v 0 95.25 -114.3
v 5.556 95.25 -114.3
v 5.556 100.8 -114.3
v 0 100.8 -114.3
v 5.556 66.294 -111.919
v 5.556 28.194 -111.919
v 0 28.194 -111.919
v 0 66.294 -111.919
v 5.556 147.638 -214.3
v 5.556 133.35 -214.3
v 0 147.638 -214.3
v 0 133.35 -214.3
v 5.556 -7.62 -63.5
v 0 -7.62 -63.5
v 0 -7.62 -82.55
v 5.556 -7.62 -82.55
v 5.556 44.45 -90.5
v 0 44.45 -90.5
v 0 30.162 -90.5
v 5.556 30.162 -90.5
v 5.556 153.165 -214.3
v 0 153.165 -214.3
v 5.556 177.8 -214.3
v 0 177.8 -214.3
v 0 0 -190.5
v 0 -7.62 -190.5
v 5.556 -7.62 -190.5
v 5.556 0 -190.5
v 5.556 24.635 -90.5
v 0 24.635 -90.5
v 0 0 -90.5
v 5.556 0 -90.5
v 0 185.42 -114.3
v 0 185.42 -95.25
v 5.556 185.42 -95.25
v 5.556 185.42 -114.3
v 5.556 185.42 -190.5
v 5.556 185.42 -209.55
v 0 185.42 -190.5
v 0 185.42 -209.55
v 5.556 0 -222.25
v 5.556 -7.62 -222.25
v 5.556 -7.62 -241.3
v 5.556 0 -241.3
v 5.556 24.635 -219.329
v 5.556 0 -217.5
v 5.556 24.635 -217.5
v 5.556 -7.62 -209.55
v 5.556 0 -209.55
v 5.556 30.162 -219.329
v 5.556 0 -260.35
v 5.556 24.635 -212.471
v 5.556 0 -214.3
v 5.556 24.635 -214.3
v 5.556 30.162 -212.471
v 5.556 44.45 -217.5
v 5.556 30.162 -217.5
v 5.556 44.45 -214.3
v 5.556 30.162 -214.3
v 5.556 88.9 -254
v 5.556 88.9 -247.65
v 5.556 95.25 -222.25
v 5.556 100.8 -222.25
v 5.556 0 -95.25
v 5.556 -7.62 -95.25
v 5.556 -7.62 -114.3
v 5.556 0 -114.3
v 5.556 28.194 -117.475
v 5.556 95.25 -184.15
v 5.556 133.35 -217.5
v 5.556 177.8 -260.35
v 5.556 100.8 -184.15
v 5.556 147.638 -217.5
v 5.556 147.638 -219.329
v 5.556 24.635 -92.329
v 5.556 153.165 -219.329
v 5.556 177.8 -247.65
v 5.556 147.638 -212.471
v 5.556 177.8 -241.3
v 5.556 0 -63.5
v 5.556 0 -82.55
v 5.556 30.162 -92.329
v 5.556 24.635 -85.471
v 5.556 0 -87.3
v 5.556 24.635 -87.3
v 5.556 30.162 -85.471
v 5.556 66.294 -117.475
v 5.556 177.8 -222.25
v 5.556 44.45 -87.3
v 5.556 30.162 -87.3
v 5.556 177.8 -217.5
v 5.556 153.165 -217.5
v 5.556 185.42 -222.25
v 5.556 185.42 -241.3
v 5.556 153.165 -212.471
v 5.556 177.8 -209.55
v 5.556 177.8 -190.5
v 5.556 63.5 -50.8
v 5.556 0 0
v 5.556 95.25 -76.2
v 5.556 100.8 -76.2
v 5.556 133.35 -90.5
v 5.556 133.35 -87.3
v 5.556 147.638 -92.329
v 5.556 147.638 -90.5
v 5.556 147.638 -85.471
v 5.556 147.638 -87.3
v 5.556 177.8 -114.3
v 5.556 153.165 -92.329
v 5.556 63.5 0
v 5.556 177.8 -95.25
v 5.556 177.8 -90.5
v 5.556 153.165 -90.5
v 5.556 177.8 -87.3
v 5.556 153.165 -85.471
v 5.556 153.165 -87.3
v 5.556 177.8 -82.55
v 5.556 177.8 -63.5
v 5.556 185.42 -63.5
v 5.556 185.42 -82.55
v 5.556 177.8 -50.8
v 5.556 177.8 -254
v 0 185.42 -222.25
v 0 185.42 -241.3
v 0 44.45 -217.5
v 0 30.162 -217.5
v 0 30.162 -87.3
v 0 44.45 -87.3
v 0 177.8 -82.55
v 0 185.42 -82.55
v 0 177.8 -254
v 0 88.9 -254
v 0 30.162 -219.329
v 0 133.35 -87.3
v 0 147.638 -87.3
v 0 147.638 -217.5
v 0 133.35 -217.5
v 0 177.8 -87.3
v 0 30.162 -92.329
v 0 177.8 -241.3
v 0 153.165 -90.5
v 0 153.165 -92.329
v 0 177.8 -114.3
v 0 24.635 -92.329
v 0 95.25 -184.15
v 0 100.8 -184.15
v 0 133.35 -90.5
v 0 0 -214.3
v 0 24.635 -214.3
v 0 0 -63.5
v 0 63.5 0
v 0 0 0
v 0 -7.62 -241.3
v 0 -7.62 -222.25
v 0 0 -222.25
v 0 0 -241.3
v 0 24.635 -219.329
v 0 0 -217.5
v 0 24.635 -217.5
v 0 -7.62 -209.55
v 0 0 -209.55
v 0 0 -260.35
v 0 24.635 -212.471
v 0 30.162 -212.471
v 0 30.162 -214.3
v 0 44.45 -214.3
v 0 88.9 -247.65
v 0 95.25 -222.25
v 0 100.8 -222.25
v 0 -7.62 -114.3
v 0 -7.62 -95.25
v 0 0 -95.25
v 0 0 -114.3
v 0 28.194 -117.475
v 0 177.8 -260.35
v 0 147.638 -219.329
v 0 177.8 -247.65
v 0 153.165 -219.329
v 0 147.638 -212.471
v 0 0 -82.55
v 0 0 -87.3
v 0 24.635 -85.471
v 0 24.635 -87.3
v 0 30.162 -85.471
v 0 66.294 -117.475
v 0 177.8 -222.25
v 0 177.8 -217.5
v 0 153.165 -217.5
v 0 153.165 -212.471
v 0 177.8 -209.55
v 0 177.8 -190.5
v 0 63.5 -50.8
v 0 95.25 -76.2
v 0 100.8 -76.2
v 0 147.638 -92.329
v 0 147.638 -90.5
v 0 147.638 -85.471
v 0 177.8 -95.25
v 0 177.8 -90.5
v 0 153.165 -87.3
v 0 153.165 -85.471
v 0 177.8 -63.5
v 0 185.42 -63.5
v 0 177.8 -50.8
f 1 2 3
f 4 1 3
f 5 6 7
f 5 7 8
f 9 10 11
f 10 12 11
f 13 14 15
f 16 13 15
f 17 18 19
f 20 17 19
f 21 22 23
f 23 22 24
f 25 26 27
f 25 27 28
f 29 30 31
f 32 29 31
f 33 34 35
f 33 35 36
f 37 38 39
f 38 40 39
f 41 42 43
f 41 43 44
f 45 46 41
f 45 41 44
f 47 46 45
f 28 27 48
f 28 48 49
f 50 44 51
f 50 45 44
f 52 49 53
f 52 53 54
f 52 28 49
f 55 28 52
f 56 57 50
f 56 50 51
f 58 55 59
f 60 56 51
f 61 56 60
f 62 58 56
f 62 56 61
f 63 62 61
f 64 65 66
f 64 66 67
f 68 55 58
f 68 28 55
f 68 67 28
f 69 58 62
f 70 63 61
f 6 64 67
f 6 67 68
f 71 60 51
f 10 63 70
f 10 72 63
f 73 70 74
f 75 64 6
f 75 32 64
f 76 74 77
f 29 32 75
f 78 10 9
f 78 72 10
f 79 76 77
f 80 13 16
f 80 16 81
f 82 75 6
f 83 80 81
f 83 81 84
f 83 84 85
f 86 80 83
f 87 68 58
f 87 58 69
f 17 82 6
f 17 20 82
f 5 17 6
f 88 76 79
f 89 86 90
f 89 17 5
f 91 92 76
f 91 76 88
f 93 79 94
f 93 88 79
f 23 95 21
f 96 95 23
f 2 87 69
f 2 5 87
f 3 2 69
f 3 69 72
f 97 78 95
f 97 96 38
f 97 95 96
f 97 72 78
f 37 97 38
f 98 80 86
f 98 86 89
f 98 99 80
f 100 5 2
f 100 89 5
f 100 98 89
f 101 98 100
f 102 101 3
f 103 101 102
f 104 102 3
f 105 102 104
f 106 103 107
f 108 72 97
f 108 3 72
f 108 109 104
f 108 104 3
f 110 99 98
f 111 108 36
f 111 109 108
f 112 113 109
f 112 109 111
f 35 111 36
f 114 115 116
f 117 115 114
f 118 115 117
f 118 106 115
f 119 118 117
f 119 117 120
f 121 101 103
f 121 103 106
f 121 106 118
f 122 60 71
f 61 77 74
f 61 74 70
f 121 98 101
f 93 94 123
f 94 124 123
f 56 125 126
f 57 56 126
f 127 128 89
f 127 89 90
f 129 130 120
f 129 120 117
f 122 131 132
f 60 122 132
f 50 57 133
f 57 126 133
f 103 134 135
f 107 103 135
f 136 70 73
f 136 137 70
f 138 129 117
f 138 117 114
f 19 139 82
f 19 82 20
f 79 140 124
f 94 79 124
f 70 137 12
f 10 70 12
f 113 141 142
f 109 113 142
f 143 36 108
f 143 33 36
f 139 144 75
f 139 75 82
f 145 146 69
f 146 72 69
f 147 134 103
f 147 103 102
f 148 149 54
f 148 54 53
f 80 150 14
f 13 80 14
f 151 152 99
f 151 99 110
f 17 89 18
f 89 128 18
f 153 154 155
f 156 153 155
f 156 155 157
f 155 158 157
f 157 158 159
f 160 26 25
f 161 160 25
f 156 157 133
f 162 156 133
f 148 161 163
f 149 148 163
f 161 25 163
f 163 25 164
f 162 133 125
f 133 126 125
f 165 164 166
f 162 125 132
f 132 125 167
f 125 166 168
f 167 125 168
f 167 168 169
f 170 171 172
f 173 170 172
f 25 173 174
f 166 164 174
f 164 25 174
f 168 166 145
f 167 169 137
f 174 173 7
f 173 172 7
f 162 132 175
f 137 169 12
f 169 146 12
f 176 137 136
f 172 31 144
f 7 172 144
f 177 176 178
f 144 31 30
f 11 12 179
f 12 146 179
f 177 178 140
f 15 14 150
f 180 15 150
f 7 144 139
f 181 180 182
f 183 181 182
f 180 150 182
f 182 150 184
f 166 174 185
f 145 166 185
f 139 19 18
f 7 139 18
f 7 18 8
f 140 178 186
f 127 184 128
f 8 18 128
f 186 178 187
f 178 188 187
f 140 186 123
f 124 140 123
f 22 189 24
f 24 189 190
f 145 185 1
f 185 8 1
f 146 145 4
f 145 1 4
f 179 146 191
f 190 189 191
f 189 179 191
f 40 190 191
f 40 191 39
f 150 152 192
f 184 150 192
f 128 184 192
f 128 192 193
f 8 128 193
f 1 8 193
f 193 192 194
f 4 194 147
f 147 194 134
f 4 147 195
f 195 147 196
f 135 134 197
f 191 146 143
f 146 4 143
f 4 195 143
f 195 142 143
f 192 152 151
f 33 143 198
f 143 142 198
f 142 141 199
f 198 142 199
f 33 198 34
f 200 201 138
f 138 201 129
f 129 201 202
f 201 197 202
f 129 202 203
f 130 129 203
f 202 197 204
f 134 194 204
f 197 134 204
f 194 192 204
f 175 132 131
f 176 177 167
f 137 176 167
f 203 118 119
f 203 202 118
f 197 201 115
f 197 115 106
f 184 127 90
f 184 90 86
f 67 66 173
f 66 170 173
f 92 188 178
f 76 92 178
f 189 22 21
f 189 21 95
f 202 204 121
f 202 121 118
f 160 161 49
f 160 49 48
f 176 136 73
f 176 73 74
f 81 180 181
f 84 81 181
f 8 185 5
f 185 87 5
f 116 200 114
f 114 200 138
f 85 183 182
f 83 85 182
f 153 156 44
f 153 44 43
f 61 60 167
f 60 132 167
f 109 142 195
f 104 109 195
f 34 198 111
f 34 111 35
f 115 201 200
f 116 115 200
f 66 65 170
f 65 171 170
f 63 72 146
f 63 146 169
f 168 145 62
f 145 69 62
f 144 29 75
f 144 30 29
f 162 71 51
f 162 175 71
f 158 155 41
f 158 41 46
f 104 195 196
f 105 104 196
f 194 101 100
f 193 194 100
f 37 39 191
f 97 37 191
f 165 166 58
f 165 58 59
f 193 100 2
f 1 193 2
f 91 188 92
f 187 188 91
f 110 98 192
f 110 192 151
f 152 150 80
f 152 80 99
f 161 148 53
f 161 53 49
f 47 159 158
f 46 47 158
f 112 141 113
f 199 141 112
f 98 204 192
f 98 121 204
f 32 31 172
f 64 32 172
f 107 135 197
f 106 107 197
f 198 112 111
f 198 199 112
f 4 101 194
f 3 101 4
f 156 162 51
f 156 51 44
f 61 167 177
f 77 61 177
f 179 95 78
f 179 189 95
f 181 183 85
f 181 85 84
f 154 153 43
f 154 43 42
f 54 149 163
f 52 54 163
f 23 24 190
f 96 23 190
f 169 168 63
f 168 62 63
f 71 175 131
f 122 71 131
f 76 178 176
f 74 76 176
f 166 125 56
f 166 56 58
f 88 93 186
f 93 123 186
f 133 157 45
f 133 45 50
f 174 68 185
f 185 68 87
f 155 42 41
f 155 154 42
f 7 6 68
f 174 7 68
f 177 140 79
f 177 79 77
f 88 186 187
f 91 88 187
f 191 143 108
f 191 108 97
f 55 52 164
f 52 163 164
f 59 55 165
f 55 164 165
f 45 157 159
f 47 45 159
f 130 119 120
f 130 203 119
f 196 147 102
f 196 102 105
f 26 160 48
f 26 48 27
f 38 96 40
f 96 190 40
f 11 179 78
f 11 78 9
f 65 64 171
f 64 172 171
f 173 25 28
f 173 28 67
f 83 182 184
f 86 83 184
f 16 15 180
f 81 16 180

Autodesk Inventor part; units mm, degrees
ref_plane "YZ Plane" through (0, 0, 0) normal (1, 0, 0) x (0, 1, 0)
ref_plane "XZ Plane" through (0, 0, 0) normal (0, 1, 0) x (-1, 0, 0)
ref_plane "XY Plane" through (0, 0, 0) normal (0, 0, 1) x (1, 0, 0)
sketch "Sketch1" plane through (0, 0, 0) normal (1, 0, 0) x (0, 1, 0)
  line L0 (0, 0) -> (177.8, 0)
  line L1 (177.8, -260.35) -> (0, -260.35)
  line L2 (0, -260.35) -> (0, -241.3)
  line L3 (0, -241.3) -> (-7.62, -241.3)
  line L4 (-7.62, -241.3) -> (-7.62, -222.25)
  line L5 (-7.62, -222.25) -> (0, -222.25)
  line L6 (0, -209.55) -> (-7.62, -209.55)
  line L7 (-7.62, -209.55) -> (-7.62, -190.5)
  line L8 (-7.62, -190.5) -> (0, -190.5)
  line L9 (0, -190.5) -> (0, -152.4)
  line L10 (44.45, -215.9) -> (44.45, -214.2998)
  line L11 (44.45, -217.5002) -> (44.45, -215.9)
  line L12 (24.6348, -214.2998) -> (24.6348, -212.725)
  line L13 (24.6348, -219.075) -> (24.6348, -219.329)
  line L14 (24.6348, -219.329) -> (30.1625, -219.329)
  line L15 (24.6348, -212.725) -> (24.6348, -212.471)
  line L16 (24.6348, -212.471) -> (30.1625, -212.471)
  line L17 (24.6348, -219.075) -> (24.6348, -217.4875)
  line L18 (30.1625, -212.471) -> (30.1625, -214.2998)
  line L19 (30.1625, -217.5002) -> (30.1625, -219.329)
  line L20 (44.45, -214.2998) -> (30.1625, -214.2998)
  line L21 (24.6348, -214.2998) -> (0, -214.2998)
  line L22 (44.45, -217.5002) -> (30.1625, -217.5002)
  line L23 (24.6348, -217.5002) -> (0, -217.5002)
  line L24 (0, -63.5) -> (-7.62, -63.5)
  line L25 (-7.62, -63.5) -> (-7.62, -82.55)
  line L26 (-7.62, -82.55) -> (0, -82.55)
  line L27 (0, -95.25) -> (-7.62, -95.25)
  line L28 (-7.62, -95.25) -> (-7.62, -114.3)
  line L29 (-7.62, -114.3) -> (0, -114.3)
  line L30 (44.45, -88.9) -> (44.45, -90.5002)
  line L31 (44.45, -87.2998) -> (44.45, -88.9)
  line L32 (24.6348, -90.5002) -> (24.6348, -92.075)
  line L33 (24.6348, -85.725) -> (24.6348, -85.471)
  line L34 (24.6348, -85.471) -> (30.1625, -85.471)
  line L35 (24.6348, -92.075) -> (24.6348, -92.329)
  line L36 (24.6348, -92.329) -> (30.1625, -92.329)
  line L37 (24.6348, -85.725) -> (24.6348, -87.3125)
  line L38 (30.1625, -92.329) -> (30.1625, -90.5002)
  line L39 (30.1625, -87.2998) -> (30.1625, -85.471)
  line L40 (44.45, -90.5002) -> (30.1625, -90.5002)
  line L41 (24.6348, -90.5002) -> (0, -90.5002)
  line L42 (44.45, -87.2998) -> (30.1625, -87.2998)
  line L43 (24.6348, -87.2998) -> (0, -87.2998)
  line L44 (177.8, -241.3) -> (185.42, -241.3)
  line L45 (185.42, -241.3) -> (185.42, -222.25)
  line L46 (185.42, -222.25) -> (177.8, -222.25)
  line L47 (177.8, -209.55) -> (185.42, -209.55)
  line L48 (185.42, -209.55) -> (185.42, -190.5)
  line L49 (185.42, -190.5) -> (177.8, -190.5)
  line L50 (177.8, -190.5) -> (177.8, -152.4)
  line L51 (133.35, -215.9) -> (133.35, -214.2998)
  line L52 (133.35, -217.5002) -> (133.35, -215.9)
  line L53 (153.1652, -214.2998) -> (153.1652, -212.725)
  line L54 (153.1652, -219.075) -> (153.1652, -219.329)
  line L55 (153.1652, -219.329) -> (147.6375, -219.329)
  line L56 (153.1652, -212.725) -> (153.1652, -212.471)
  line L57 (153.1652, -212.471) -> (147.6375, -212.471)
  line L58 (153.1652, -219.075) -> (153.1652, -217.4875)
  line L59 (147.6375, -212.471) -> (147.6375, -214.2998)
  line L60 (147.6375, -217.5002) -> (147.6375, -219.329)
  line L61 (133.35, -214.2998) -> (147.6375, -214.2998)
  line L62 (153.1652, -214.2998) -> (177.8, -214.2998)
  line L63 (133.35, -217.5002) -> (147.6375, -217.5002)
  line L64 (153.1652, -217.5002) -> (177.8, -217.5002)
  line L65 (185.42, -63.5) -> (185.42, -82.55)
  line L66 (185.42, -82.55) -> (177.8, -82.55)
  line L67 (177.8, -95.25) -> (185.42, -95.25)
  line L68 (185.42, -95.25) -> (185.42, -114.3)
  line L69 (185.42, -114.3) -> (177.8, -114.3)
  line L70 (153.1652, -85.725) -> (153.1652, -85.471)
  line L71 (153.1652, -85.725) -> (153.1652, -87.3125)
  line L72 (153.1652, -85.471) -> (147.6375, -85.471)
  line L73 (147.6375, -87.2998) -> (147.6375, -85.471)
  line L74 (177.8, -63.5) -> (185.42, -63.5)
  line L75 (153.1652, -90.5002) -> (153.1652, -92.075)
  line L76 (153.1652, -92.075) -> (153.1652, -92.329)
  line L77 (153.1652, -92.329) -> (147.6375, -92.329)
  line L78 (147.6375, -92.329) -> (147.6375, -90.5002)
  line L79 (133.35, -87.2998) -> (147.6375, -87.2998)
  line L80 (133.35, -87.2998) -> (133.35, -88.9)
  line L81 (133.35, -90.5002) -> (147.6375, -90.5002)
  line L82 (153.1652, -87.2998) -> (177.8, -87.2998)
  line L83 (153.1652, -90.5002) -> (177.8, -90.5002)
  line L84 (133.35, -88.9) -> (133.35, -90.5002)
  line L85 (177.8, -260.35) -> (177.8, -254)
  line L86 (177.8, -254) -> (88.9, -254)
  line L87 (88.9, -254) -> (88.9, -247.65)
  line L88 (88.9, -247.65) -> (177.8, -247.65)
  line L89 (177.8, -254) -> (177.8, -260.35)
  line L90 (177.8, 0) -> (177.8, -63.5)
  line L91 (177.8, -114.3) -> (177.8, -190.5)
  line L92 (177.8, -241.3) -> (177.8, -247.65)
  line L93 (0, -260.35) -> (0, -241.3)
  line L94 (0, -190.5) -> (0, -114.3)
  line L95 (0, -63.5) -> (0, 0)
  line L96 (0, -82.55) -> (0, -87.2998)
  line L97 (0, -90.5002) -> (0, -95.25)
  line L98 (0, -95.25) -> (0, -90.5002)
  line L99 (0, -87.2998) -> (0, -82.55)
  line L100 (0, -222.25) -> (0, -217.5002)
  line L101 (0, -214.2998) -> (0, -209.55)
  line L102 (0, -222.25) -> (0, -217.5002)
  line L103 (0, -214.2998) -> (0, -209.55)
  line L104 (177.8, -222.25) -> (177.8, -217.5002)
  line L105 (177.8, -214.2998) -> (177.8, -209.55)
  line L106 (177.8, -209.55) -> (177.8, -214.2998)
  line L107 (177.8, -217.5002) -> (177.8, -222.25)
  line L108 (177.8, -82.55) -> (177.8, -87.2998)
  line L109 (177.8, -90.5002) -> (177.8, -95.25)
  line L110 (177.8, -82.55) -> (177.8, -87.2998)
  line L111 (177.8, -90.5002) -> (177.8, -95.25)
  dimension "d0" = 177.8
  dimension "d1" = 260.35
  dimension "d8" = 38.1
  dimension "d16" = 0.254
  dimension "d17" = 0.254
  dimension "d18" = 6.35
extrude "Extrusion1" add sketch "Sketch1" along normal blind 5.5563
sketch "Sketch2" plane through (5.5563, 0, 0) normal (1, 0, 0) x (0, 0, -1)
  line L0 (63.5, 177.8) -> (0, 177.8) projected
  line L1 (0, 177.8) -> (50.8, 177.8)
  line L2 (50.8, 177.8) -> (50.8, 63.5)
  line L3 (50.8, 63.5) -> (0, 63.5)
  line L4 (0, 177.8) -> (0, 0) projected
  line L5 (0, 177.8) -> (0, 63.5)
extrude "Extrusion2" cut sketch "Sketch2" against normal blind 25.4
sketch "Sketch3" plane through (5.5563, 0, 0) normal (1, 0, 0) x (0, 0, -1)
  line L0 (190.5, 177.8) -> (114.3, 177.8) projected
  line L1 (247.65, 88.9) -> (247.65, 177.8) projected
  line L2 (76.2, 100.8) -> (76.2, 95.25)
  line L3 (114.3, 95.25) -> (114.3, 100.8)
  line L4 (184.15, 100.8) -> (184.15, 95.25)
  line L5 (222.25, 95.25) -> (222.25, 100.8)
  line L6 (76.2, 100.8) -> (114.3, 100.8)
  line L7 (184.15, 100.8) -> (222.25, 100.8)
  line L8 (95.25, 95.25) -> (76.2, 95.25)
  line L9 (95.25, 95.25) -> (114.3, 95.25)
  line L10 (184.15, 95.25) -> (222.25, 95.25)
  point P0 (0, 0)
extrude "Extrusion3" cut sketch "Sketch3" against normal blind 25.4
sketch "Sketch4" plane through (5.5563, 0, 0) normal (1, 0, 0) x (0, 0, -1)
  line L0 (111.9187, 28.194) -> (117.475, 28.194)
  line L1 (117.475, 28.194) -> (117.475, 66.294)
  line L2 (117.475, 66.294) -> (111.9187, 66.294)
  line L3 (111.9187, 47.244) -> (111.9187, 66.294)
  line L4 (111.9187, 28.194) -> (111.9187, 47.244)
  point P0 (0, 0)
extrude "Extrusion4" cut sketch "Sketch4" against normal blind 25.4
properties part number "sidewall"
